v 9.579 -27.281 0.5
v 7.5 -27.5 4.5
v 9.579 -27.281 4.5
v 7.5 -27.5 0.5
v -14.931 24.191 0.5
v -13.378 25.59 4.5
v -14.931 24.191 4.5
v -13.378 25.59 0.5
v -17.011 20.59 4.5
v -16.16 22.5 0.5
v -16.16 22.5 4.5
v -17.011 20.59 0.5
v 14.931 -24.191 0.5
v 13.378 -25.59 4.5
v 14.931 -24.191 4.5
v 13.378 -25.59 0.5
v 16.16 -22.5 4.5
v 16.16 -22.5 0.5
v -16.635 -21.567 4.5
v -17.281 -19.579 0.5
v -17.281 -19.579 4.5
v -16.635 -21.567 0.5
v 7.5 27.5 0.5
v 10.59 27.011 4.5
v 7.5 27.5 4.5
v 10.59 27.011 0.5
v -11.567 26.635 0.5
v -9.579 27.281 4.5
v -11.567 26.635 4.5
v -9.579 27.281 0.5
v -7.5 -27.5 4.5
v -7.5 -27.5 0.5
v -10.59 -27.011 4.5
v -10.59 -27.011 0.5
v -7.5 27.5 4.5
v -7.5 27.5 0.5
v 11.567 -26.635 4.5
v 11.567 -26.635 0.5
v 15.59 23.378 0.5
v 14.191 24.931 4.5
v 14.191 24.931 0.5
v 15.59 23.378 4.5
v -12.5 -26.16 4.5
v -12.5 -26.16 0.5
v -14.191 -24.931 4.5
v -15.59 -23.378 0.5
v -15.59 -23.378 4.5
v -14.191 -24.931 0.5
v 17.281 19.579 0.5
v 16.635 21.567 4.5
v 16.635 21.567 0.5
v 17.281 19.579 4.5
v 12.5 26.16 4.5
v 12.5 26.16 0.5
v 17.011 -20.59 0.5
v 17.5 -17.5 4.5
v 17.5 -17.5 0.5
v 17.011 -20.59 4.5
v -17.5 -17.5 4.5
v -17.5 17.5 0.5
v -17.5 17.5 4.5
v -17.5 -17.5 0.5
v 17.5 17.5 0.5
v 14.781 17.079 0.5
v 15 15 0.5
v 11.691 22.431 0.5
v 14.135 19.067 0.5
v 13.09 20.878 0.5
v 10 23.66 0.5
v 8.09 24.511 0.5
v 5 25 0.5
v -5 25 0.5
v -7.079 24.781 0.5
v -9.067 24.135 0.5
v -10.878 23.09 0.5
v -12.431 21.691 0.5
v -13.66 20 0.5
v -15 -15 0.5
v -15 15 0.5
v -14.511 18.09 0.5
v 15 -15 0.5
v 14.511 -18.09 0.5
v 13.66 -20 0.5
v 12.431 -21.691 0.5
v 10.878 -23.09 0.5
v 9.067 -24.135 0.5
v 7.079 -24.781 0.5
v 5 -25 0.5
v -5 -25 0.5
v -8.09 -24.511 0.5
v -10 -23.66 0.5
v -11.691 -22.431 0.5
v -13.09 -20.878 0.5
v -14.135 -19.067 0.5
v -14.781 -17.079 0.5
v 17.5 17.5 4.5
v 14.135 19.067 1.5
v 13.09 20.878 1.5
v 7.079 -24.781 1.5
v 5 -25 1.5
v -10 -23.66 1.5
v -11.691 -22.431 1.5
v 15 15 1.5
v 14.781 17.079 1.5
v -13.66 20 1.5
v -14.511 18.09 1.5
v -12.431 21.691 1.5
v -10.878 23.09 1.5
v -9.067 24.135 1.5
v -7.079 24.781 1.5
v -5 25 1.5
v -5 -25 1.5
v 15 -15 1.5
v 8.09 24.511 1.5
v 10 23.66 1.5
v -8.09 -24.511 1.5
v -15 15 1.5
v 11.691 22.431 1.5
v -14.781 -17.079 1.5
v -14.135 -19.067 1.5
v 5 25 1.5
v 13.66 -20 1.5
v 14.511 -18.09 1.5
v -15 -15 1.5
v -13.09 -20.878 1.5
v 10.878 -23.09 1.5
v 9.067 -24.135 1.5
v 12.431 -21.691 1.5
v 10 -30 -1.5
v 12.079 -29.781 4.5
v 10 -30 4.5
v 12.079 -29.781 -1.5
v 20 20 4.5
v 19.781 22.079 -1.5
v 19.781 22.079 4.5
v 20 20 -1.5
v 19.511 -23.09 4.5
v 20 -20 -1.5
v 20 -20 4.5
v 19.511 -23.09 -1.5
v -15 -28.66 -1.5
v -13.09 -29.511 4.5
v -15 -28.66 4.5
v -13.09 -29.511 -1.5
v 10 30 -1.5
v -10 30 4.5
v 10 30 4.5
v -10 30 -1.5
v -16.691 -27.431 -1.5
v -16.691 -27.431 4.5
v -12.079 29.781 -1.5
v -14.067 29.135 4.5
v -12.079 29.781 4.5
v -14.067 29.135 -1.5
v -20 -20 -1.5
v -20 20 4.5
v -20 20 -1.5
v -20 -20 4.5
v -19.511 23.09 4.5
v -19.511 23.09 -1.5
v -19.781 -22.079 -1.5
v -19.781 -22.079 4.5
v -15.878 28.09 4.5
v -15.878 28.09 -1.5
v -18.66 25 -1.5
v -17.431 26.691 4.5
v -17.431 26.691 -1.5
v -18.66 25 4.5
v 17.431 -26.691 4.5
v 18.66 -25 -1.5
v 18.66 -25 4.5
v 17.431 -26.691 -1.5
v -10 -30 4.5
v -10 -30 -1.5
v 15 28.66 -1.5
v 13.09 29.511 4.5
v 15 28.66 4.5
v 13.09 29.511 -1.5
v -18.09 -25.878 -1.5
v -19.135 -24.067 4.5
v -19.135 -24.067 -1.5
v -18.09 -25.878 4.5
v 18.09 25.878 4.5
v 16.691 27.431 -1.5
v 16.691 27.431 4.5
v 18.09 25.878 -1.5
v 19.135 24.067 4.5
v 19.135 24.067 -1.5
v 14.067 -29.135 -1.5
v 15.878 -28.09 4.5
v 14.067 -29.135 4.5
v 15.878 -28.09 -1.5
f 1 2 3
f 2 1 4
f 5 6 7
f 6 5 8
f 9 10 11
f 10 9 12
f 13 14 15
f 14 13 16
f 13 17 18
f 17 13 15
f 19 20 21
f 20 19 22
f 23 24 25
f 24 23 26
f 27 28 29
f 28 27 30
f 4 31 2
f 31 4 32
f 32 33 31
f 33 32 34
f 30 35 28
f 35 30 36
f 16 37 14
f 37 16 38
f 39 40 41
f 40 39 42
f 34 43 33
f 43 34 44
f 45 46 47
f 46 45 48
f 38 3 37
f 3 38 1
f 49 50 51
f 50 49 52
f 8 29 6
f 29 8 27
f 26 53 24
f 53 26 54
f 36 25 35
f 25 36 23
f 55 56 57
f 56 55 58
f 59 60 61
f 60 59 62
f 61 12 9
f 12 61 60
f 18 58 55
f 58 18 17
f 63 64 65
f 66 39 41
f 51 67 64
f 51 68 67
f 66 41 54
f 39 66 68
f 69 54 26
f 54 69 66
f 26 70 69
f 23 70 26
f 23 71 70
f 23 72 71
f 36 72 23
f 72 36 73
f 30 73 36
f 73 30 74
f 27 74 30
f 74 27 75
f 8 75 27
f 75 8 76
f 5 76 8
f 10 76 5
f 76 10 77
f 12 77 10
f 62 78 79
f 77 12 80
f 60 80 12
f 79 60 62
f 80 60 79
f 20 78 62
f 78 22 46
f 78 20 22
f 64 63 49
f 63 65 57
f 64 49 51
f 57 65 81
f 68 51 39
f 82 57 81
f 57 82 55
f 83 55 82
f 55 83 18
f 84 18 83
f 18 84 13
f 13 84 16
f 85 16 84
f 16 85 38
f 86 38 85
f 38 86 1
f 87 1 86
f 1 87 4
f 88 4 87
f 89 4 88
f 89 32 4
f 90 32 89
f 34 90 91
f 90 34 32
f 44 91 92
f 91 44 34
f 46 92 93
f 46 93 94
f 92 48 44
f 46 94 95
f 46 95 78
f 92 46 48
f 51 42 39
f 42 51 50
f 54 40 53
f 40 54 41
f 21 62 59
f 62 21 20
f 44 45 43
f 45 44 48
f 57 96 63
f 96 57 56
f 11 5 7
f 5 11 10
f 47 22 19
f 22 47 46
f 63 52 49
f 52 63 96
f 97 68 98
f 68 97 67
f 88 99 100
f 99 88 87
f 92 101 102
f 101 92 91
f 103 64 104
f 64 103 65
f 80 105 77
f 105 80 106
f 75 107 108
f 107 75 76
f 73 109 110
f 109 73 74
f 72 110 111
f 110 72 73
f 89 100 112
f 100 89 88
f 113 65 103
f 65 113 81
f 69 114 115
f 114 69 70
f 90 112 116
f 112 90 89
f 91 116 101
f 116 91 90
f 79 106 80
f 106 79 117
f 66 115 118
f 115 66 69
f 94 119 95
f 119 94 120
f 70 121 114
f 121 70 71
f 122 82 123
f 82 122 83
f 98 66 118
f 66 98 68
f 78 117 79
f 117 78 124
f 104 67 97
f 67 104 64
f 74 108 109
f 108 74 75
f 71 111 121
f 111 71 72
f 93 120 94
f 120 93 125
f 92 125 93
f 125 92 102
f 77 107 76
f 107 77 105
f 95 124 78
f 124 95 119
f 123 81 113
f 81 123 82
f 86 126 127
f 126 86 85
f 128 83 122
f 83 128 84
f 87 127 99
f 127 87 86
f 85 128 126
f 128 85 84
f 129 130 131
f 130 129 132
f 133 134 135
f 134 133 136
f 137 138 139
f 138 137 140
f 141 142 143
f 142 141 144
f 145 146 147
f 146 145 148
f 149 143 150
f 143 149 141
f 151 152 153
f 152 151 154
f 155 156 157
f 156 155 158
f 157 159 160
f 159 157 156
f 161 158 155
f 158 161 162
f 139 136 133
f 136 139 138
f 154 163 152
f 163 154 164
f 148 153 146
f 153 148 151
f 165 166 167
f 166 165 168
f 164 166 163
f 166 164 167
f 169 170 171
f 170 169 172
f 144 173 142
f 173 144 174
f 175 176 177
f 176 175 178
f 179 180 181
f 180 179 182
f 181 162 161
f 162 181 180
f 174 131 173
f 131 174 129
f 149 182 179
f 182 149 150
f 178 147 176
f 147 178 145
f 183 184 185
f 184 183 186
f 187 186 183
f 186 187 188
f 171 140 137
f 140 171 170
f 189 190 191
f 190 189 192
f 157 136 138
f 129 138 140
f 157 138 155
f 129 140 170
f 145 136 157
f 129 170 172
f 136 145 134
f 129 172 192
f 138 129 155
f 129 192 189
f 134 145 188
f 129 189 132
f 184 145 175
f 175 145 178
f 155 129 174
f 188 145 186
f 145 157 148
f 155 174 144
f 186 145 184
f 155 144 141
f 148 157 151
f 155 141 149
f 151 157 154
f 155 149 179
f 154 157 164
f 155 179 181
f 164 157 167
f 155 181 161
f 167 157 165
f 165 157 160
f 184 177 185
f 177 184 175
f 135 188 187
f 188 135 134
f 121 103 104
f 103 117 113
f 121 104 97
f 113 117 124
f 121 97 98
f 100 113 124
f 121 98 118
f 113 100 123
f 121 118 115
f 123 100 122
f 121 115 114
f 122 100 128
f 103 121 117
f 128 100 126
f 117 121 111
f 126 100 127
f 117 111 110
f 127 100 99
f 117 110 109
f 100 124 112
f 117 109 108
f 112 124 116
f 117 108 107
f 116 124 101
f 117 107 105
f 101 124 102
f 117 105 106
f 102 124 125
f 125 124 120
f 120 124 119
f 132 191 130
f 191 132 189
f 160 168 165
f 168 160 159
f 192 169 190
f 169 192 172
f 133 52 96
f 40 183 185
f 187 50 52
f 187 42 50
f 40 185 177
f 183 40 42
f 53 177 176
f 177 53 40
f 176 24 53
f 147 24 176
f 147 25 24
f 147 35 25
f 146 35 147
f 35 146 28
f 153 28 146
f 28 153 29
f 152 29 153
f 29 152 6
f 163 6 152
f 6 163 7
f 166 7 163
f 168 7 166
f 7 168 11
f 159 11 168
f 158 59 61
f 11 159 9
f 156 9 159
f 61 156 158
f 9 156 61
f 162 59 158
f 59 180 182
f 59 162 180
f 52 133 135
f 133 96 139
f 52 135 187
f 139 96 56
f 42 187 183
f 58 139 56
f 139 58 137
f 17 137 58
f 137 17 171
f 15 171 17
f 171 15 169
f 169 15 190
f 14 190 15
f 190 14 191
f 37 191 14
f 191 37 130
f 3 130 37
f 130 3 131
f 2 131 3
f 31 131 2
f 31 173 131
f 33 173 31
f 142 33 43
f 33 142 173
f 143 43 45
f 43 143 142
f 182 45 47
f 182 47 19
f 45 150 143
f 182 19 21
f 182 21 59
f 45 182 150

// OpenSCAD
/*
 * Test for a stamp mold
 */
echo(version=version());

logo = "./images/TAO.png"; 
imgRatio = 1.0;
logox = 600 * imgRatio; 
logoy = 500 * imgRatio; 

module roundedRect(size, radius) {  
	linear_extrude(height=size.z, center=true) {
		offset(radius) offset(-radius) {
			square([size.x, size.y], center = true);
		}
	}
}

// Base plate
// ----------
plateWidth = 40;
plateLength = 60;
plateThickNess = 3;
cornerRadius = 10;

difference() {  
	union() {
		difference() {
			roundedRect([plateWidth, plateLength, plateThickNess], cornerRadius);
			translate([0, 0, 2]) {
				scale([.9 * plateWidth / logox, .9 * plateWidth / logoy, .02]) {
					color("white") {
						rotate([0, 0, -90]) {
							surface(file=logo, invert=true, center=true);
						}
					}
				}
        // the groove around the picture
        difference() {
          roundedRect([plateWidth -  5, plateLength -  5, plateThickNess], cornerRadius);
          roundedRect([plateWidth - 10, plateLength - 10, plateThickNess * 1.1], cornerRadius);
        }
			}
		}
		// The frame
		translate([0, 0, (plateThickNess / 1)]) {
			difference() {
				roundedRect([plateWidth, plateLength, plateThickNess], cornerRadius);
				roundedRect([plateWidth - 5, plateLength - 5, plateThickNess * 1.1], cornerRadius);
			}
		}
	}
}
